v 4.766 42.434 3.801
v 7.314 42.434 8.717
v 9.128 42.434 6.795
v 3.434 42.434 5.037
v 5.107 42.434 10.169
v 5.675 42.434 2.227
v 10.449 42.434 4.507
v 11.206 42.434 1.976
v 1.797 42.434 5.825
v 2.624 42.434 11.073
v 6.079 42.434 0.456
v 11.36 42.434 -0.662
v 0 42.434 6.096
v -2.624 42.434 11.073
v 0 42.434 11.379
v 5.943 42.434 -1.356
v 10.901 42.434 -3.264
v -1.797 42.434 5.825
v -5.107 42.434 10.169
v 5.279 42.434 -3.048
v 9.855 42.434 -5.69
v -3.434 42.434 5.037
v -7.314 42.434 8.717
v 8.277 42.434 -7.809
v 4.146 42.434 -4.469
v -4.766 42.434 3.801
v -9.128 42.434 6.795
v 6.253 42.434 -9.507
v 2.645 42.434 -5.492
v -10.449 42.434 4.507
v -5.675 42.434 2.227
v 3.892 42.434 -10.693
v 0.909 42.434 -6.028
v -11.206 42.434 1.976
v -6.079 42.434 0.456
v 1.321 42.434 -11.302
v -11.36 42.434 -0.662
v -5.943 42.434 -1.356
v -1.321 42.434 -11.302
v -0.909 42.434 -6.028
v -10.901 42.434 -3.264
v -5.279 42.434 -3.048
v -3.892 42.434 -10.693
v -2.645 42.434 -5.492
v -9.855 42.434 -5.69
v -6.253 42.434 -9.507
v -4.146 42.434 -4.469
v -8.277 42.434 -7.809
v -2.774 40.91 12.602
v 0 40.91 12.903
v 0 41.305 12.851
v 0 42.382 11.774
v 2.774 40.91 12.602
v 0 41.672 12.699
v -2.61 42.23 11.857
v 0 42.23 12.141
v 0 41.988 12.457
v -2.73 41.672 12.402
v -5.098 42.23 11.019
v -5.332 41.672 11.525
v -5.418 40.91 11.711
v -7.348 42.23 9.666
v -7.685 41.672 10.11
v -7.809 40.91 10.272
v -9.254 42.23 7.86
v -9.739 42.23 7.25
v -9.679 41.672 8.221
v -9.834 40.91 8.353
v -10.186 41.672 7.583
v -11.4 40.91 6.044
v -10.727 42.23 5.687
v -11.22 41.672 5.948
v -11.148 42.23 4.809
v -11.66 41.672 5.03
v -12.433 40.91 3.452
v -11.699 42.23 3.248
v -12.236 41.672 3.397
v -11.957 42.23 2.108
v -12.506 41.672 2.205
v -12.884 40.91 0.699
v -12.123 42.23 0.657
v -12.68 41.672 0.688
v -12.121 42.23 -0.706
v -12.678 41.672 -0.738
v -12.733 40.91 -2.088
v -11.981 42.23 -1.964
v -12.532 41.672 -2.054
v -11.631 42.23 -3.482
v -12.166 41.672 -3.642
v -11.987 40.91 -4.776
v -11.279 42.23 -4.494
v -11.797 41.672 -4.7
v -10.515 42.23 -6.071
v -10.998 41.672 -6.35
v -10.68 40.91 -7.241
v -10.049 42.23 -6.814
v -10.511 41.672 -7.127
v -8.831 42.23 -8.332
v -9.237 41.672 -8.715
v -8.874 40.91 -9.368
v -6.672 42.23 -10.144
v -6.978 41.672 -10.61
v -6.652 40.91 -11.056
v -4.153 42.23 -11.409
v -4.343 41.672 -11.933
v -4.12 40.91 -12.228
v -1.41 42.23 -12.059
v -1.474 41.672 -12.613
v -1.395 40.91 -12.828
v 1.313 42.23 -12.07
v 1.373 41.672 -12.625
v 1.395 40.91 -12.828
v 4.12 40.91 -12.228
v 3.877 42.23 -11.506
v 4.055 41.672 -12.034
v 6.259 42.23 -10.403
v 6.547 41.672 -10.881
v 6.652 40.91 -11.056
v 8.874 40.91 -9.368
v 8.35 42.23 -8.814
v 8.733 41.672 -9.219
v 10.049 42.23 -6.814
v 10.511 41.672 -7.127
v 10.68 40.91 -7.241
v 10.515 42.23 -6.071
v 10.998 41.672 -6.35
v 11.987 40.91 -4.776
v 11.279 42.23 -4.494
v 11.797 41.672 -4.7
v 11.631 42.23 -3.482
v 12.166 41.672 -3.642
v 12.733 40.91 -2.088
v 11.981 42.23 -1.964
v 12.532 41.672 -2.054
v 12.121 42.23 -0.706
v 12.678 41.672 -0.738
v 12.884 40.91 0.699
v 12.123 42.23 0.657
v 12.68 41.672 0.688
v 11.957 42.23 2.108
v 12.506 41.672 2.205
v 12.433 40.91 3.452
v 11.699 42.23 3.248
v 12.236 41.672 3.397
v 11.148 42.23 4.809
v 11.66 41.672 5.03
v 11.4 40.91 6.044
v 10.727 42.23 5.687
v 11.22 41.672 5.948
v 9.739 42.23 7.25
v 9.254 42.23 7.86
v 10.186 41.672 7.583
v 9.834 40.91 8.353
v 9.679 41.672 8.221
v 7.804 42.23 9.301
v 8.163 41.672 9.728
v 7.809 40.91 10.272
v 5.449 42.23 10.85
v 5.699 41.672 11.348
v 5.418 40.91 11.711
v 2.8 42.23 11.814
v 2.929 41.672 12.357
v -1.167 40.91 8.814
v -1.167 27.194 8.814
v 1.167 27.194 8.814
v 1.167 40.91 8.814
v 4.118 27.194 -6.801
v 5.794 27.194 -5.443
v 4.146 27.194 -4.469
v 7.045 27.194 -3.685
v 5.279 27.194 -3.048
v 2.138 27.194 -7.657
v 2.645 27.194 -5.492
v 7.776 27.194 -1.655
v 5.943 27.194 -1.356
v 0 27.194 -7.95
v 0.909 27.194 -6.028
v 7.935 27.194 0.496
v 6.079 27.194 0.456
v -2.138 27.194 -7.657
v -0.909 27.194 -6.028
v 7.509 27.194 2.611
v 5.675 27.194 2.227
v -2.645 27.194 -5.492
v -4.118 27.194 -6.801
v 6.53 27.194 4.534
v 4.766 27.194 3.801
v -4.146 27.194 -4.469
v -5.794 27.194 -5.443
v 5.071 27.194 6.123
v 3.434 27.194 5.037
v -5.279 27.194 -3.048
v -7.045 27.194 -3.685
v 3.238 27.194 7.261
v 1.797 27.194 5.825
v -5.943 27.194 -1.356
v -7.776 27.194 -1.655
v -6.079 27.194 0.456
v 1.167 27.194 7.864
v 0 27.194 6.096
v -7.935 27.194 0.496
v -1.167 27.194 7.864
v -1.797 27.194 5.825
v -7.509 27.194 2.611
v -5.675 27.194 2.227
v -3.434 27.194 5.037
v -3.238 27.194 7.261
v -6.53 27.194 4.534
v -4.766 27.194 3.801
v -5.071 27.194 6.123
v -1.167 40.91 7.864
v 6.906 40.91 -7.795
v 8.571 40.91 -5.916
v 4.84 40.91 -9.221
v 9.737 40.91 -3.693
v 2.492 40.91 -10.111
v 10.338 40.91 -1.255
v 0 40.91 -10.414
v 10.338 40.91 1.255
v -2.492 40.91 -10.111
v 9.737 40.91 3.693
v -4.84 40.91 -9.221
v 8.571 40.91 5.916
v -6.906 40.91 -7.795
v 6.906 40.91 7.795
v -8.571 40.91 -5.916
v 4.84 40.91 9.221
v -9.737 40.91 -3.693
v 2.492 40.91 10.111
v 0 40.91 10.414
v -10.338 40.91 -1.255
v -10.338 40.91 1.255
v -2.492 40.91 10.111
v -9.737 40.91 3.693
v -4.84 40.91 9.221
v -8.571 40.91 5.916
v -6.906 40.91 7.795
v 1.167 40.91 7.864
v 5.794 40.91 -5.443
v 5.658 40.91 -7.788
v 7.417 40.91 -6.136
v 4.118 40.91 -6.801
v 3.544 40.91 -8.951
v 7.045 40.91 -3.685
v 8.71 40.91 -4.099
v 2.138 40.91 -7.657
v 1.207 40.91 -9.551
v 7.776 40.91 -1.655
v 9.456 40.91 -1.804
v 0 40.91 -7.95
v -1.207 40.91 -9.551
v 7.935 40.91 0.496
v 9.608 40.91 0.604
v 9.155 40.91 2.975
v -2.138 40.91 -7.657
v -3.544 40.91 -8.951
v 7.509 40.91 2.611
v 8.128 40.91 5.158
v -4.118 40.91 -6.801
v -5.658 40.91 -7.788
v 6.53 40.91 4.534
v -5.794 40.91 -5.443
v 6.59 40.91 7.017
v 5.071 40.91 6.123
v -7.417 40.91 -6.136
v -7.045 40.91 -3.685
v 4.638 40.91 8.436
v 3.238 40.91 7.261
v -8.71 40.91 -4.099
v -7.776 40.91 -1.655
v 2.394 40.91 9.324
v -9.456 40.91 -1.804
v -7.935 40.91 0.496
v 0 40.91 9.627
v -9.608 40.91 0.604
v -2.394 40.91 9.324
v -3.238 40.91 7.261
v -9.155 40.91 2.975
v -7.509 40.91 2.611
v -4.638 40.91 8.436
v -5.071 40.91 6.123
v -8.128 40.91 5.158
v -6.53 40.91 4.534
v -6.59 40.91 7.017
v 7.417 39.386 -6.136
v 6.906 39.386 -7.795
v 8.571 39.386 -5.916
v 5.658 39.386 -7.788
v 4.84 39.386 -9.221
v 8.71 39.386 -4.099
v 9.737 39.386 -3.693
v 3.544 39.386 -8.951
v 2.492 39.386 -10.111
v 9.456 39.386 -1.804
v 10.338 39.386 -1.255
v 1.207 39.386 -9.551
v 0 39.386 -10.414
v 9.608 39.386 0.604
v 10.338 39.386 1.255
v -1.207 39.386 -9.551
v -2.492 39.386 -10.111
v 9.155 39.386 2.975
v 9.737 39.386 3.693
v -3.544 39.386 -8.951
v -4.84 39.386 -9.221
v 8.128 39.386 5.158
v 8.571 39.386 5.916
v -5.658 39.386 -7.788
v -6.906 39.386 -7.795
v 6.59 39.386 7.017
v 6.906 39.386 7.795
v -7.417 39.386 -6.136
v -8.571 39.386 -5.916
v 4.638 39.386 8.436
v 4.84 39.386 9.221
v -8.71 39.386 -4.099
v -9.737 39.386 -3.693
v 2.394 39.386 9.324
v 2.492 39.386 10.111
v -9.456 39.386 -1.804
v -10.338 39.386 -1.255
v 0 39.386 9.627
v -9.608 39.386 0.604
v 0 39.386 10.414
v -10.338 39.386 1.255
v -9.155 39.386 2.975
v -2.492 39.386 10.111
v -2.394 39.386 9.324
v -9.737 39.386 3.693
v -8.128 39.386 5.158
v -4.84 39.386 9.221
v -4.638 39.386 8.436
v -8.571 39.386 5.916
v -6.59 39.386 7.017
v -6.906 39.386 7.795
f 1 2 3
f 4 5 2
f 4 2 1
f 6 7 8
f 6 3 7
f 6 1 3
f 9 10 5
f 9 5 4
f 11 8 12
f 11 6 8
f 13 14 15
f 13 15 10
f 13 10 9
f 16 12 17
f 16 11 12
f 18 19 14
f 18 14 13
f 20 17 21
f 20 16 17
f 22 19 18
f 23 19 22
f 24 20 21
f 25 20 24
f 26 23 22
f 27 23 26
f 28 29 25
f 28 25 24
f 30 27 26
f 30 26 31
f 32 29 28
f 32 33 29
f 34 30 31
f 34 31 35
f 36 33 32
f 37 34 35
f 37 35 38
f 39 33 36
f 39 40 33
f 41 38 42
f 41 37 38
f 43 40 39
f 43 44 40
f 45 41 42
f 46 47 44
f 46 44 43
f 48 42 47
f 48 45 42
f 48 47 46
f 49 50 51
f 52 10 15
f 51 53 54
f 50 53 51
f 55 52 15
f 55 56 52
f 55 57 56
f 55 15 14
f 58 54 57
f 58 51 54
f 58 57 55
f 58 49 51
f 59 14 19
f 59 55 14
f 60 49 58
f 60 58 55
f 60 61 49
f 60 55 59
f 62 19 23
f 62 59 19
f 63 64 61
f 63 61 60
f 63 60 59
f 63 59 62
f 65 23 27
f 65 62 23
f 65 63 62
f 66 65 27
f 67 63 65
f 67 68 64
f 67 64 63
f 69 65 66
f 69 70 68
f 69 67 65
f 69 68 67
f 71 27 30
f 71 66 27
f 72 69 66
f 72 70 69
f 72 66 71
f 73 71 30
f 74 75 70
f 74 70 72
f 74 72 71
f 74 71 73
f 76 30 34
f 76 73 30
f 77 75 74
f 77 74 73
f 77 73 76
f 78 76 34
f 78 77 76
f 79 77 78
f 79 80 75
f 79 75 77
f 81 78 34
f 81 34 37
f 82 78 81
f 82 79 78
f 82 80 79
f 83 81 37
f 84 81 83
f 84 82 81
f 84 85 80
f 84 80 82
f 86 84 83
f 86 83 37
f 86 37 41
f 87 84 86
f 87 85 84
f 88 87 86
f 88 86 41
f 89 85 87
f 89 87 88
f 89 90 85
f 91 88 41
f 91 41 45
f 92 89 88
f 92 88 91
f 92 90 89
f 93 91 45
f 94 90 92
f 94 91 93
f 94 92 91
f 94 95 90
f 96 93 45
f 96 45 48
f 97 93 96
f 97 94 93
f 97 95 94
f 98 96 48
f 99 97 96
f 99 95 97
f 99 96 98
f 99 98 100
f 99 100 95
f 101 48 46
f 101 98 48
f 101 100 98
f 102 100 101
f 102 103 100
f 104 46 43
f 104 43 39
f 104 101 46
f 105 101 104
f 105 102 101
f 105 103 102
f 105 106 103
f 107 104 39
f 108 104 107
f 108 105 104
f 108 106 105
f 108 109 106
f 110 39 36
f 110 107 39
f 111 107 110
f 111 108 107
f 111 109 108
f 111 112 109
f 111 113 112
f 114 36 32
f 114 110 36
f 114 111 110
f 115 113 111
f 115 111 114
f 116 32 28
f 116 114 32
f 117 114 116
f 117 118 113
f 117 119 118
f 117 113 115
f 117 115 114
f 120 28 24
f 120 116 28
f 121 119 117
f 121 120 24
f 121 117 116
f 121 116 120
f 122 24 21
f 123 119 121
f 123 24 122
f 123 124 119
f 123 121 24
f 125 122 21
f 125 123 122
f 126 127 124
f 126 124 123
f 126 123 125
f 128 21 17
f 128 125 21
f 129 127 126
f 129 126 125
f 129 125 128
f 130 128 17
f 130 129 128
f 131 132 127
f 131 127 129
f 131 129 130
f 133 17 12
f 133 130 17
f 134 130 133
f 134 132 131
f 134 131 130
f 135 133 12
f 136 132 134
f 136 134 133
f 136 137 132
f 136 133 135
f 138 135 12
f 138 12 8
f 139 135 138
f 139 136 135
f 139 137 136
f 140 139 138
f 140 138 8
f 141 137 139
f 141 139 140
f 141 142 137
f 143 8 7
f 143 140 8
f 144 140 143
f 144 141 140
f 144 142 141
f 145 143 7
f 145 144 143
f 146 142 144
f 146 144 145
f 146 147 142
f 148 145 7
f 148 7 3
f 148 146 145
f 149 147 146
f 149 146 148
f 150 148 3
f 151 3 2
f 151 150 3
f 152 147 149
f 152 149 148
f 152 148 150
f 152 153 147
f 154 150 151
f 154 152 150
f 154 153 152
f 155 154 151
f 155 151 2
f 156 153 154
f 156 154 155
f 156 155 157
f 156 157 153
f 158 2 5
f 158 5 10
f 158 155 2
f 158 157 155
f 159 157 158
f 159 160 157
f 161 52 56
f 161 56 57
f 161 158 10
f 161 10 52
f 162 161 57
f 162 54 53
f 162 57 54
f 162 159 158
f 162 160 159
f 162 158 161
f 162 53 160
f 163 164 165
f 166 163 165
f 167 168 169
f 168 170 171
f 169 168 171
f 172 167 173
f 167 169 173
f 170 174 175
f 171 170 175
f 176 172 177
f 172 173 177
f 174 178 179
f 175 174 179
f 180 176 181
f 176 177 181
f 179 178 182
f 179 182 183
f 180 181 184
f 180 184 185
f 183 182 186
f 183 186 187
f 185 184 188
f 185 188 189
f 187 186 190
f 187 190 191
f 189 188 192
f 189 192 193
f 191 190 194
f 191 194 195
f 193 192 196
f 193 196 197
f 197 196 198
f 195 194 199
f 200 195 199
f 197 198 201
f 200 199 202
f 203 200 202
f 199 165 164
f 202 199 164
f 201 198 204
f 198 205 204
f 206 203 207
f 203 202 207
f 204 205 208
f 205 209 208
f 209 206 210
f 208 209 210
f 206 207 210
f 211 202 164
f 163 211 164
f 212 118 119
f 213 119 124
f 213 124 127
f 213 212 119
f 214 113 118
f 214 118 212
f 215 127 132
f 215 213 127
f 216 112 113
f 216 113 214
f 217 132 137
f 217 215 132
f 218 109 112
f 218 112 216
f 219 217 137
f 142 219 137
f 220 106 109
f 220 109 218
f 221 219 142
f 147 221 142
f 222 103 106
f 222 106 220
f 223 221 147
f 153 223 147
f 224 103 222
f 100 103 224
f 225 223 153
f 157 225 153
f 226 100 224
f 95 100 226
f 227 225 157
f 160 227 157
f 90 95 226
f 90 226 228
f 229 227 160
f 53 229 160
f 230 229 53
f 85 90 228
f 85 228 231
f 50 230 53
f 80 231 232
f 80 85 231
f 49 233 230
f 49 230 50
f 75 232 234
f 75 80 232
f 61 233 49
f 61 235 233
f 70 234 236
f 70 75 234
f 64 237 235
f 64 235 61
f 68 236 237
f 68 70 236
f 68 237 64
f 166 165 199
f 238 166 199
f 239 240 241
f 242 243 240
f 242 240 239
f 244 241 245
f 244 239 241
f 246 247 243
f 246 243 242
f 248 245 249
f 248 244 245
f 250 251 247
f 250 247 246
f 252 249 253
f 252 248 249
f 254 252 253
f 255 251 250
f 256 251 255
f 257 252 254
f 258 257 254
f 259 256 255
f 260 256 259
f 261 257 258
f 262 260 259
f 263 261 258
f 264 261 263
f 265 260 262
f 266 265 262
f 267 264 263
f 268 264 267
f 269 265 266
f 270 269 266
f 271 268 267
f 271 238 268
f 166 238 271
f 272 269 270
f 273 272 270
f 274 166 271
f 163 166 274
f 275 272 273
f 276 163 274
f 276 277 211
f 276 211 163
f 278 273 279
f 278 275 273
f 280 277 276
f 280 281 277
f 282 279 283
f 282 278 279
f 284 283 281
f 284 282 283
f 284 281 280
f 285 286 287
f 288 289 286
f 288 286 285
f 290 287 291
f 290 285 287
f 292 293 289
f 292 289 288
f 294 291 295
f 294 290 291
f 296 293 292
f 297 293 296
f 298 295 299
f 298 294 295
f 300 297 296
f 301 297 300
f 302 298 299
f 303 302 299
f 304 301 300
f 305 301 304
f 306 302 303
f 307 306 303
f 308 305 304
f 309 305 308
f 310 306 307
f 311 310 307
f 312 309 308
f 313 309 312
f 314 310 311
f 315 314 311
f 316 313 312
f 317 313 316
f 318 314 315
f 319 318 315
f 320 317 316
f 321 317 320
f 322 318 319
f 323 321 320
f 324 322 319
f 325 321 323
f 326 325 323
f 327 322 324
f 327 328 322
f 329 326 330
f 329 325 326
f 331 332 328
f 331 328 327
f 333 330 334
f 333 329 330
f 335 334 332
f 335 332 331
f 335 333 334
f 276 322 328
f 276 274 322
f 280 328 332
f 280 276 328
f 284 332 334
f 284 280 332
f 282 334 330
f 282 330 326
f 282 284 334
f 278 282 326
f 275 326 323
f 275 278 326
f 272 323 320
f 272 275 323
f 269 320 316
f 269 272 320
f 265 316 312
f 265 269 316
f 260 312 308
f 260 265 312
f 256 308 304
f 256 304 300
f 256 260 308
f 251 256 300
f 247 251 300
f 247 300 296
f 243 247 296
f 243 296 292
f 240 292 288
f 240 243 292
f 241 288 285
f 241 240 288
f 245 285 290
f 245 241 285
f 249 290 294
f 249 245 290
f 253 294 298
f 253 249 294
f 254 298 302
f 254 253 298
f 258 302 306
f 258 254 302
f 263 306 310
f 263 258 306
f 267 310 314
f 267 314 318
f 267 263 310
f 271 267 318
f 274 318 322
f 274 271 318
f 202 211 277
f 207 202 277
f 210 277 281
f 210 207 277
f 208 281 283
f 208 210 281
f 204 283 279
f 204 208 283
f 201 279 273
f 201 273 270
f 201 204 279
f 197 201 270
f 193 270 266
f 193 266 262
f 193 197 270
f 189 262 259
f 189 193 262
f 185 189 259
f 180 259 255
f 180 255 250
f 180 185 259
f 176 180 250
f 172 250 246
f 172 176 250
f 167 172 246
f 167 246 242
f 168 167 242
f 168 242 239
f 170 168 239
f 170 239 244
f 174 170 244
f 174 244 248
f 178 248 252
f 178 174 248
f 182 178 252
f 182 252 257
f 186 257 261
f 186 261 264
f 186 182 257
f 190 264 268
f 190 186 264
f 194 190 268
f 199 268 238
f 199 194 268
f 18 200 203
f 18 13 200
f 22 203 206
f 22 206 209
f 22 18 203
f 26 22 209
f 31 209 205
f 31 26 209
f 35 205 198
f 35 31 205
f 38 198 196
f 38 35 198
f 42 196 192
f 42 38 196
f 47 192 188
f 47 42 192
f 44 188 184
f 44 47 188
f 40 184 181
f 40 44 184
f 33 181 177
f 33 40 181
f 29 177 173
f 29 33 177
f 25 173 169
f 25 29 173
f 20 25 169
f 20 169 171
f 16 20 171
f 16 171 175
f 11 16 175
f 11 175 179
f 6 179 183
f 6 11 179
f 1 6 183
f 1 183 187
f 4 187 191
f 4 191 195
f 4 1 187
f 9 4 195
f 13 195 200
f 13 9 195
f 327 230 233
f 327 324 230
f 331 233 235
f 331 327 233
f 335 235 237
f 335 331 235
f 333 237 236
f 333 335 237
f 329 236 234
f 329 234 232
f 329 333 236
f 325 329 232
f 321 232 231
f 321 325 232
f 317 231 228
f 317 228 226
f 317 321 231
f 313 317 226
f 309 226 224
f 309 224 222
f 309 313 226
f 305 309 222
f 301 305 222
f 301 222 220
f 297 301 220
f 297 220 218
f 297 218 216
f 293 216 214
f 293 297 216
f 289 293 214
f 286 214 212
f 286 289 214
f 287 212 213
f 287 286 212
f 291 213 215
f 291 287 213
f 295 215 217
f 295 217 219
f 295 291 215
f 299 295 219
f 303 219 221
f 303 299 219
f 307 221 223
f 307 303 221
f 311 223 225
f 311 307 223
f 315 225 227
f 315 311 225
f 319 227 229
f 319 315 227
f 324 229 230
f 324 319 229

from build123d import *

# Parameters (mm, degrees)
FILLET1_R           = 1.524
BOSS_EXTRUDE1_START = -13.716
BOSS_EXTRUDE1_DEPTH = 13.716


with BuildPart() as part:
    # Sketch1 → Base-Revolve (revolve)
    with BuildSketch(Plane.XY, mode=Mode.PRIVATE) as base_revolve_sk:
        Polygon((10.414, 39.386322837), (9.6266, 39.386322837), (9.6266, 40.910322837), (7.9502, 40.910322837), (7.9502, 27.194322837), (6.096, 27.194322837), (6.096, 42.434322837), (12.9032, 42.434322837), (12.9032, 40.910322837), (10.414, 40.910322837), align=None)
    revolve(base_revolve_sk.sketch.rotate(Axis((0, 42.434322837, 0), (0, -1, 0)), 90), axis=Axis((0, 42.434322837, 0), (0, -1, 0)))

    # Fillet1
    fillet1_edges = [part.edges().sort_by_distance(p)[0] for p in [
        (0, 42.434322837, -12.9032),
    ]]
    fillet(fillet1_edges, radius=FILLET1_R - 0.0001)  # a hair under: the kernel refuses the full size

    # Sketch3 → Boss-Extrude1 (add)
    with BuildSketch(Plane.XZ.offset(-27.194322837).offset(BOSS_EXTRUDE1_START)):
        with BuildLine():
            Line((-1.166541413, 7.864150378), (-1.166541413, 8.8138))
            Line((-1.166541413, 8.8138), (1.166541413, 8.8138))
            Line((1.166541413, 8.8138), (1.166541413, 7.864150378))
            ThreePointArc((1.166541413, 7.864150378), (0, 7.9502), (-1.166541413, 7.864150378))
        make_face()
    extrude(amount=BOSS_EXTRUDE1_DEPTH)


solid = part.part
